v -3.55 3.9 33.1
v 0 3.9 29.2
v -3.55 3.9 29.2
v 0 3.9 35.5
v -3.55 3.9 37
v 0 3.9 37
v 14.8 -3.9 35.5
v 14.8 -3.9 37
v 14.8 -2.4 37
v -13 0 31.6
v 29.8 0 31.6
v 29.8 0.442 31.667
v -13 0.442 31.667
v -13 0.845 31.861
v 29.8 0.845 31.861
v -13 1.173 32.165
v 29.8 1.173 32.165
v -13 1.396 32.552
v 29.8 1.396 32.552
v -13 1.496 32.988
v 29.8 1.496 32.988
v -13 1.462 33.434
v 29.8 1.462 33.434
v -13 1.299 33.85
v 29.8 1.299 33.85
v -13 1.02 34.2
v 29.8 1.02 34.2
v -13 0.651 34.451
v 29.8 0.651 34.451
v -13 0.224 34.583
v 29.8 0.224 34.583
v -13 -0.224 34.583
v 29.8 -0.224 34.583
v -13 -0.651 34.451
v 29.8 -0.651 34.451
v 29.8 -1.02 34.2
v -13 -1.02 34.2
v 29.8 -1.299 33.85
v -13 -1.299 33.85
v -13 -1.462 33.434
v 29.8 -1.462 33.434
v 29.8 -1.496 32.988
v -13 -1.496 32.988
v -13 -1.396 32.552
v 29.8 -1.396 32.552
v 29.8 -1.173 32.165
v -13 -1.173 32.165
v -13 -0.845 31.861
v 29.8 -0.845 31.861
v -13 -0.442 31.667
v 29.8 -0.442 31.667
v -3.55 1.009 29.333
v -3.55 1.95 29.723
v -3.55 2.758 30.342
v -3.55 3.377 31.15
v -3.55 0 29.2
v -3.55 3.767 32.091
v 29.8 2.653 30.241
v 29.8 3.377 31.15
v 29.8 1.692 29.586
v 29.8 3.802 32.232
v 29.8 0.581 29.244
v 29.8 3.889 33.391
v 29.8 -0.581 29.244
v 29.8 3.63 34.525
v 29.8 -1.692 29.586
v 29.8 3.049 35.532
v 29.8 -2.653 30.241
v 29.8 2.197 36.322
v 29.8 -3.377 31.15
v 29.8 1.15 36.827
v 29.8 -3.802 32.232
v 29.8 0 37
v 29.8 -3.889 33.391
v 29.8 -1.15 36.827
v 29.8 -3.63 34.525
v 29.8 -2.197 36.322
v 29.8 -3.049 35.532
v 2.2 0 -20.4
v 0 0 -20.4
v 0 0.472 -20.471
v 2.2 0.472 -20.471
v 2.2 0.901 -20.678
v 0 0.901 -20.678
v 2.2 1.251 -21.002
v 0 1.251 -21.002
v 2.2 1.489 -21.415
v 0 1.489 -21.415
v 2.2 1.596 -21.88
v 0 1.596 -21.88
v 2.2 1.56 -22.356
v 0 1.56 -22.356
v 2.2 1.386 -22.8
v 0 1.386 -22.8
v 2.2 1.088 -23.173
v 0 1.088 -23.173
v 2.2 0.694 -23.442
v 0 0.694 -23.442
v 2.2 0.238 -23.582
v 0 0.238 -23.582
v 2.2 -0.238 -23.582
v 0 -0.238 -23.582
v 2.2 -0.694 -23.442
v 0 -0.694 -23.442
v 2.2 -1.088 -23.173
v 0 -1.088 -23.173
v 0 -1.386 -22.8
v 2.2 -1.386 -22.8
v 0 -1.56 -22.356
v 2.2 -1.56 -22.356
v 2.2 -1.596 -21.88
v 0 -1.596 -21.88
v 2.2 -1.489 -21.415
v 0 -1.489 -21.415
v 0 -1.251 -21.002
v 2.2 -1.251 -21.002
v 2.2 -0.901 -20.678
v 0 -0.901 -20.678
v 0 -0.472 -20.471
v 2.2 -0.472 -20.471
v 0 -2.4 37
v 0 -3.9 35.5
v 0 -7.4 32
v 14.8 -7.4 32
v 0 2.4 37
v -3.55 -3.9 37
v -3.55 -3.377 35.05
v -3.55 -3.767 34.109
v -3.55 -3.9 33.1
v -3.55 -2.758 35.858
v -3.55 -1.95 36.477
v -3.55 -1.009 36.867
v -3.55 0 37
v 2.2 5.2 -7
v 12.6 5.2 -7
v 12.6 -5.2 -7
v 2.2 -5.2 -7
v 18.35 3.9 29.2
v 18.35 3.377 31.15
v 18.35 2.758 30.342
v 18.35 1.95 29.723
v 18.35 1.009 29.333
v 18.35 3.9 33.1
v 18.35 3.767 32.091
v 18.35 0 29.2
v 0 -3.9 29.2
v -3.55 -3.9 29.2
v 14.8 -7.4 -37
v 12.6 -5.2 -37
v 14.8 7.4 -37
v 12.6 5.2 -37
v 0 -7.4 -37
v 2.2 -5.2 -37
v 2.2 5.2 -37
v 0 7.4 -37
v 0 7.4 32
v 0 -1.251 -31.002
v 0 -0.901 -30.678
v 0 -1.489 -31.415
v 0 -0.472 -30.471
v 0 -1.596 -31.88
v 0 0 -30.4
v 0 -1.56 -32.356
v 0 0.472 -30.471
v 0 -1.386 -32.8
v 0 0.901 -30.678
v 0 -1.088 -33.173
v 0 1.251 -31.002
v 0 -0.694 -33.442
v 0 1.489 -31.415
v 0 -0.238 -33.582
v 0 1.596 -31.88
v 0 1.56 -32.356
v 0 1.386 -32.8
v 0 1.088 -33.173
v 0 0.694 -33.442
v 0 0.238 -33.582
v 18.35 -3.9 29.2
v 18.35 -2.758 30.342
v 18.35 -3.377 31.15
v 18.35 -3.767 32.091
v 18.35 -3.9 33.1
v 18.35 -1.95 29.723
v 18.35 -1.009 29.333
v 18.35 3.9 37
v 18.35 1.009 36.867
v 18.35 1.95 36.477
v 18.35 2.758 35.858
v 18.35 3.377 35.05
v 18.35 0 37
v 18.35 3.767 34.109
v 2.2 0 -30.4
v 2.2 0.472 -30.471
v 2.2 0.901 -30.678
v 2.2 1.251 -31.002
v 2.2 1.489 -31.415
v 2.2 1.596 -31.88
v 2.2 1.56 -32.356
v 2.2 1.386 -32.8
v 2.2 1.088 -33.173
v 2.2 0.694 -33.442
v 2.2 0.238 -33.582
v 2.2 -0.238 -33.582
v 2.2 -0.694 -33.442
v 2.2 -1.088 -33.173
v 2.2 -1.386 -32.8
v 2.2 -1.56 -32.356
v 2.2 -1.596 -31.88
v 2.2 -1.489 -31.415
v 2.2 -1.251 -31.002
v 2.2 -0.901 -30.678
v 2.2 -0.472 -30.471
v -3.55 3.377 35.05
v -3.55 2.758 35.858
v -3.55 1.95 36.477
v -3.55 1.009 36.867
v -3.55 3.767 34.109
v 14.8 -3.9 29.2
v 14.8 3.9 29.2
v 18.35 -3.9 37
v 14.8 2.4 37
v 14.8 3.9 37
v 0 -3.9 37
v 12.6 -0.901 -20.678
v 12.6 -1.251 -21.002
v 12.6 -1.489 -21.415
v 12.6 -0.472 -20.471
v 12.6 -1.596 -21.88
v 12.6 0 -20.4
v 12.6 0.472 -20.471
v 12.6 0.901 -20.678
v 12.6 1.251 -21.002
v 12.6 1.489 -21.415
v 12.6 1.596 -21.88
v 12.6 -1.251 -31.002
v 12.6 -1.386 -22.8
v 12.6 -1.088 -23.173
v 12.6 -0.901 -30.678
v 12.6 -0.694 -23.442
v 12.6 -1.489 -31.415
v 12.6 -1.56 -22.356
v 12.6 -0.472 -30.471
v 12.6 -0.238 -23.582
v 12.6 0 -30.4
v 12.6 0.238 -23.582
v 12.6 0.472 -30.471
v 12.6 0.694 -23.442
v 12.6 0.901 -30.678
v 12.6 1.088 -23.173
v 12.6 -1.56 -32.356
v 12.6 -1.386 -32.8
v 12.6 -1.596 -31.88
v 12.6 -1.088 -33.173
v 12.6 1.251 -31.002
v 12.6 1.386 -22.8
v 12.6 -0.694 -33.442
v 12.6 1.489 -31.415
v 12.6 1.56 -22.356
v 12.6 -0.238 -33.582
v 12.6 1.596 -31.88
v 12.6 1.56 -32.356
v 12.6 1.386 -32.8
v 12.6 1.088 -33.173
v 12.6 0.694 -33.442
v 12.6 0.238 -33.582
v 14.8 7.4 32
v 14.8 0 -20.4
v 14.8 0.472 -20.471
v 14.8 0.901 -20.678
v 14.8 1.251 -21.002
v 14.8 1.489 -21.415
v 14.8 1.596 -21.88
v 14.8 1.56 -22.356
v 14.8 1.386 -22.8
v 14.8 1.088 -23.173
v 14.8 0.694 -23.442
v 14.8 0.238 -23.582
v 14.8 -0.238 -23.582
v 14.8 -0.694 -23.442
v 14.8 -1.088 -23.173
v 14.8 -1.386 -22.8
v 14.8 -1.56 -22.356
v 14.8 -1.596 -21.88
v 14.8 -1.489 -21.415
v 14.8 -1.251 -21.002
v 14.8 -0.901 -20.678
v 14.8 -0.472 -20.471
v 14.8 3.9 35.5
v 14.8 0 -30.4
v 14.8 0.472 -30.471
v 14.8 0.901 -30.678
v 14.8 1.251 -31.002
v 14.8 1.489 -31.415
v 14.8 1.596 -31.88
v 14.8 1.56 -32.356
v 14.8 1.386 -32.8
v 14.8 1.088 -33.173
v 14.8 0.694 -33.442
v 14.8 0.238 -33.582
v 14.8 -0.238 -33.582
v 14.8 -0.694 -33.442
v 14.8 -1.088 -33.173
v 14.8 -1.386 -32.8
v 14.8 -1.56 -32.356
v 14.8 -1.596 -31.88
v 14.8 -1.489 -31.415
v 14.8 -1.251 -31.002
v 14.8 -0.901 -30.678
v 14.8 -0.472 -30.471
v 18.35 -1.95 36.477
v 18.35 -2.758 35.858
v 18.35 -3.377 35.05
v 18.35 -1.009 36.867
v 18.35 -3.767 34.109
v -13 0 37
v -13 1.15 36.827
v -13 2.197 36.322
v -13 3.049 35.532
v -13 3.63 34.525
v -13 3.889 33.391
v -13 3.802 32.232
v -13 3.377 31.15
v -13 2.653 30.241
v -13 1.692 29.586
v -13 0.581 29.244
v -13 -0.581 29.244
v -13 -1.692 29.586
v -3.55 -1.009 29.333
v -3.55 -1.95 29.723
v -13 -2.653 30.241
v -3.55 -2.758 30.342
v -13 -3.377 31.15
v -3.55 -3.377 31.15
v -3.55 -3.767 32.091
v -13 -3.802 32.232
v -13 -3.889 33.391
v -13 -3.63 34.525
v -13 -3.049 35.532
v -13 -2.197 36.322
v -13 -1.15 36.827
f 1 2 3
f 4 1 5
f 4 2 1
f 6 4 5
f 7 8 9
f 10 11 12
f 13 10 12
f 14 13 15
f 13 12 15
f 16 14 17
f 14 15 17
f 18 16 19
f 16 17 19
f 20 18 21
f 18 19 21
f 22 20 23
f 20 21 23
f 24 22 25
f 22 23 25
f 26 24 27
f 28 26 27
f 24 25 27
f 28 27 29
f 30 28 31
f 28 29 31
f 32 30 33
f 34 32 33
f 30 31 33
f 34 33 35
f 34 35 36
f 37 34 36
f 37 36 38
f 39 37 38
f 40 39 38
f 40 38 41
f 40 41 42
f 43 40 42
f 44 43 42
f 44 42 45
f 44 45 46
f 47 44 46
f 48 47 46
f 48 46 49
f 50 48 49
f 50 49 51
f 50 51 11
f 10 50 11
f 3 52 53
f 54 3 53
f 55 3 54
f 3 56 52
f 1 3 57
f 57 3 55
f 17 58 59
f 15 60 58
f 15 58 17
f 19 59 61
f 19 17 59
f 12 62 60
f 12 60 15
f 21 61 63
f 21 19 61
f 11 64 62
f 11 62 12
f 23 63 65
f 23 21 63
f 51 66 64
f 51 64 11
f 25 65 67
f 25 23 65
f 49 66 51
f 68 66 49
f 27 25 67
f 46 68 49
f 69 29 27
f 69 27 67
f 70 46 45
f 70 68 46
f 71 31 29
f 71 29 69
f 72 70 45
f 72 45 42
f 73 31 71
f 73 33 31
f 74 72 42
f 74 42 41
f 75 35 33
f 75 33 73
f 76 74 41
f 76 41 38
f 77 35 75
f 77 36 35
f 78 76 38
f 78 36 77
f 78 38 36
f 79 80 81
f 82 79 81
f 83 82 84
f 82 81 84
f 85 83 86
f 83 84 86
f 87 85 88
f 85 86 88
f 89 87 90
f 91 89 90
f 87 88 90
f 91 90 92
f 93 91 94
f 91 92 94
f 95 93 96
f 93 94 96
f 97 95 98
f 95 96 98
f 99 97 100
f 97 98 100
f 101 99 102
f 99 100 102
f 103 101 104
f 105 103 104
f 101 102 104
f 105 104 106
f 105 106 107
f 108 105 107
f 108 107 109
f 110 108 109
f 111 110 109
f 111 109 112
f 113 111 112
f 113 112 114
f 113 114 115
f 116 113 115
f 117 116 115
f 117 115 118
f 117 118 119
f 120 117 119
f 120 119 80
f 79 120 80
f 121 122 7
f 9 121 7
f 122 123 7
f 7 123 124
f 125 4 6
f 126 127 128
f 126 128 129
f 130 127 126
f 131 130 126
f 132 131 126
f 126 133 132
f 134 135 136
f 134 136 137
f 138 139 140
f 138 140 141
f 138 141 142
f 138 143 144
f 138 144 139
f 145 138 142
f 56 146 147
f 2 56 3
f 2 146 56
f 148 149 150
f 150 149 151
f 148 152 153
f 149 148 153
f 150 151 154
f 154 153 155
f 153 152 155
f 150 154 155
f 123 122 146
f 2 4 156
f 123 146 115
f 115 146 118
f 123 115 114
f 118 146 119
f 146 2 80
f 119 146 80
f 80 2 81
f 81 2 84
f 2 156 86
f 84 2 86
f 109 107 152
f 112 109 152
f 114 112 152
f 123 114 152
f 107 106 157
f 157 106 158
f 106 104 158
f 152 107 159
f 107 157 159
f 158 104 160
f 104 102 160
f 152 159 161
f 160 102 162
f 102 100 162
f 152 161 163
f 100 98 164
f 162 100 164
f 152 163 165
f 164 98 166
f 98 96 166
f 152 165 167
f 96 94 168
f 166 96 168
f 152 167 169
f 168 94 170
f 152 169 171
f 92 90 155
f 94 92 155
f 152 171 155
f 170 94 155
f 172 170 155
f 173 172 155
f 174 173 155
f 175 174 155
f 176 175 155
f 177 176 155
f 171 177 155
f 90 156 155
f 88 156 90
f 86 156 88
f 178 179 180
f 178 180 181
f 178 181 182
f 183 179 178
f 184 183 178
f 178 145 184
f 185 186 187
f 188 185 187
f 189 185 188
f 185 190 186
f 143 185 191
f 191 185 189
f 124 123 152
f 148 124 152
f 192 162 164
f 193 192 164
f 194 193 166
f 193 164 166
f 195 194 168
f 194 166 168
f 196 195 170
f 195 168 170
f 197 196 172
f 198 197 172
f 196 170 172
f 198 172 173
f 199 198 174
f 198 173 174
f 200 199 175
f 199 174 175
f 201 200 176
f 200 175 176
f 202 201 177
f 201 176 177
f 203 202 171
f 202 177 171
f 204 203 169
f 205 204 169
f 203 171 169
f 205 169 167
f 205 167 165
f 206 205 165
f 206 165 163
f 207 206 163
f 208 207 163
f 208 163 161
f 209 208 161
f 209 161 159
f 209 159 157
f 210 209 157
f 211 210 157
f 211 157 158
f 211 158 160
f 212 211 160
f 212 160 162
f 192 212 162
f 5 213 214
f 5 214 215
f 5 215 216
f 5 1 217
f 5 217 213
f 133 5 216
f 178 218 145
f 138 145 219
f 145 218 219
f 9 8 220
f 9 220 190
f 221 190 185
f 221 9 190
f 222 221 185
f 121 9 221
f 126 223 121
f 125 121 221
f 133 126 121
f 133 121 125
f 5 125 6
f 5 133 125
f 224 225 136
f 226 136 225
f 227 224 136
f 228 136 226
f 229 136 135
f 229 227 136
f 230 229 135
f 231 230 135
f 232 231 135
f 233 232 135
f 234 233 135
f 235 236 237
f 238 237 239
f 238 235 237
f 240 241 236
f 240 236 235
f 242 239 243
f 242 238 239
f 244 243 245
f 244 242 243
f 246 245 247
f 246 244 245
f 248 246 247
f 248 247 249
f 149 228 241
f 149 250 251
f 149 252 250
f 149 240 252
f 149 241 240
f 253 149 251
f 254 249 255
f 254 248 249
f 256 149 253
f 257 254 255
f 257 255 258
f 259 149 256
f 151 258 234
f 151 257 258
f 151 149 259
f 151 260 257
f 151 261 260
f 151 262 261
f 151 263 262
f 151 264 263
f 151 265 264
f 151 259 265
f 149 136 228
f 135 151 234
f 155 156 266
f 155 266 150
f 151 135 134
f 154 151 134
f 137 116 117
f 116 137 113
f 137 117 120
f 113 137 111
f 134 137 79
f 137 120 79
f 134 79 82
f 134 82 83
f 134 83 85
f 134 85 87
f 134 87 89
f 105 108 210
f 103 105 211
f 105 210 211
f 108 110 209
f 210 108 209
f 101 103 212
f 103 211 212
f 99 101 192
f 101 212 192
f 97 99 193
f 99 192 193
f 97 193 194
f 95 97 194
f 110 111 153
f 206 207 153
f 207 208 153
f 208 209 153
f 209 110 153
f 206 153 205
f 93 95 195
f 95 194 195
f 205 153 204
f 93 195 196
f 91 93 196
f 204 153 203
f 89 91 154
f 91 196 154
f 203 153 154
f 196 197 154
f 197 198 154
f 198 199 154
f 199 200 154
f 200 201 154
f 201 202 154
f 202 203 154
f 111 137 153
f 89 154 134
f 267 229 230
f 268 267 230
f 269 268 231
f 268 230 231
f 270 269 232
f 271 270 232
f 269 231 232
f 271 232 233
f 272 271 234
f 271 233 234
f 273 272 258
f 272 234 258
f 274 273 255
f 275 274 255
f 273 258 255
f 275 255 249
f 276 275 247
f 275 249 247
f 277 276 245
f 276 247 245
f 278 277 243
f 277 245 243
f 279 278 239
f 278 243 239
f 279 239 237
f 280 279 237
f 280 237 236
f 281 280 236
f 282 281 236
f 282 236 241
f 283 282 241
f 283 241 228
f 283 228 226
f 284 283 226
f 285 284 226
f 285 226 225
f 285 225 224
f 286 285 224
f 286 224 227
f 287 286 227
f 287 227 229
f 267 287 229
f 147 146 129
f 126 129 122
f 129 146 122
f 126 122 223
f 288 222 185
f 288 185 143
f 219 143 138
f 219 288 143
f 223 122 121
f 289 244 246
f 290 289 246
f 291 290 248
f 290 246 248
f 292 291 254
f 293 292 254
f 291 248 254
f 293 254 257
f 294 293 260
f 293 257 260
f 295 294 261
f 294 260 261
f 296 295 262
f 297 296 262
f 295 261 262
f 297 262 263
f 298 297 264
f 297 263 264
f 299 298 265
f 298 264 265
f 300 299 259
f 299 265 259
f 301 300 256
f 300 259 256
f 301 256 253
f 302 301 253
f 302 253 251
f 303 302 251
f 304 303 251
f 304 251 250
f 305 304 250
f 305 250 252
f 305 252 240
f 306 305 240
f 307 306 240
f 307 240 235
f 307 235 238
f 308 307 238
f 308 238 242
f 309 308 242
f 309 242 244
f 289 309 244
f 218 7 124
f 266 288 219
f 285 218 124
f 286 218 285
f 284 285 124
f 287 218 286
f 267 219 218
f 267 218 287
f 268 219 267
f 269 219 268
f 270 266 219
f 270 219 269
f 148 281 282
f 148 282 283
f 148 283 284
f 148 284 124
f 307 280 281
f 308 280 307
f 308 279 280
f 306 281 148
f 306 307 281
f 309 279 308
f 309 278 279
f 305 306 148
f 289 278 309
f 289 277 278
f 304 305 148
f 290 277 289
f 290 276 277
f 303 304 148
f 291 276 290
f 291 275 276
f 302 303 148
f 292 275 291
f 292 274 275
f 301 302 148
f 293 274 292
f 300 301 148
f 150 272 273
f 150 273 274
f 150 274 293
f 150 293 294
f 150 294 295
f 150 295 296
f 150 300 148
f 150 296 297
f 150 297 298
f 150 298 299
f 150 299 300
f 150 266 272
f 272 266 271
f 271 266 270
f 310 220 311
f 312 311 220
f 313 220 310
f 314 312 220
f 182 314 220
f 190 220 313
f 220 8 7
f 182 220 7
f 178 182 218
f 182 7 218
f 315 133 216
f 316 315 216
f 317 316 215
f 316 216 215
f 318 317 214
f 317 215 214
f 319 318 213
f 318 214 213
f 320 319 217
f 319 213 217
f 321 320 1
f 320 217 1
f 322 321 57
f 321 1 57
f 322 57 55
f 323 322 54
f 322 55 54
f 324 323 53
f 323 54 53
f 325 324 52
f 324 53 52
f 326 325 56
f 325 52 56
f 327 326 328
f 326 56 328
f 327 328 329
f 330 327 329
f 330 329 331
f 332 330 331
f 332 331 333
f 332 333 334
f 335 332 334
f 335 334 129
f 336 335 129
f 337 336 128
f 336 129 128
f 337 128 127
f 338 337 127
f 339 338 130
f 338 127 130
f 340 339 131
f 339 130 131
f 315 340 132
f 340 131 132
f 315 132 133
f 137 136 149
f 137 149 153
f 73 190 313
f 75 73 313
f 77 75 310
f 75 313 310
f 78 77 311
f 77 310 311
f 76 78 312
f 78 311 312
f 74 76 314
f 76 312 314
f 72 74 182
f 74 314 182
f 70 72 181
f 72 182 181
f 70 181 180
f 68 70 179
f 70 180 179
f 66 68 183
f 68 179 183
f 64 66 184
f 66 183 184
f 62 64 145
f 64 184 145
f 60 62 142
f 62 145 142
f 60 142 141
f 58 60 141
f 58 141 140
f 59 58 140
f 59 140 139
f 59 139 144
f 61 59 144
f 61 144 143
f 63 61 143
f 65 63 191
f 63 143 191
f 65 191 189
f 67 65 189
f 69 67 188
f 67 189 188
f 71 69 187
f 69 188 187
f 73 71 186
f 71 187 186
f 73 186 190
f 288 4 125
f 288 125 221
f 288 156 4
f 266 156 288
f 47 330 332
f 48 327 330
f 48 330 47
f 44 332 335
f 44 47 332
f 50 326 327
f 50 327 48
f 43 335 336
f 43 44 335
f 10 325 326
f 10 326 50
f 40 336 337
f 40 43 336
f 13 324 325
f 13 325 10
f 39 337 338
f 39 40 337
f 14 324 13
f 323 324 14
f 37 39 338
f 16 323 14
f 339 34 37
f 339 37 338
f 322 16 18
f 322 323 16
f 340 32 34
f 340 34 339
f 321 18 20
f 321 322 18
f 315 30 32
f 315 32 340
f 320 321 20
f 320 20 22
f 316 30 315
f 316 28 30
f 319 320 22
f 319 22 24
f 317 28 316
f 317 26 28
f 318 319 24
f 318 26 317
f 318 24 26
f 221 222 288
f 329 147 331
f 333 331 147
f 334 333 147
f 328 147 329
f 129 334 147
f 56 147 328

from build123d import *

# Parameters (mm, degrees)
SKETCH_1_W          = 74
SKETCH_1_H          = 14.8
EXTRUDE_1_DEPTH     = 14.8
SKETCH_2_W          = 10.4
SKETCH_2_H          = 10.4
CUT_EXTRUDE_1_DEPTH = 30
SKETCH_3_R          = 3.9
EXTRUDE_2_DEPTH     = 15
SKETCH_4_R          = 3.9
EXTRUDE_3_DEPTH     = 13
CHAMFER_1_SIZE      = 5
SKETCH_8_R          = 1.45
CUT_EXTRUDE_4_DEPTH = 43.8
SKETCH_9_W          = 7.8
SKETCH_9_H          = 7.8
SKETCH_9_R          = 1.5
EXTRUDE_4_DEPTH     = 3.55
SKETCH_10_W         = 7.8
SKETCH_10_H         = 7.8
EXTRUDE_5_DEPTH     = 3.55
SKETCH1_R           = 1.6
CUT_EXTRUDE1_DEPTH  = 30.8
SKETCH2_R           = 1.5
CUT_EXTRUDE2_DEPTH  = 43.8


with BuildPart() as part:
    # Эскиз1 → Бобышка-Вытянуть1 (new body)
    with BuildSketch(Plane(origin=(0, 0, 0), x_dir=(0, 0, -1), z_dir=(1, 0, 0))):
        Rectangle(SKETCH_1_W, SKETCH_1_H)
    extrude(amount=EXTRUDE_1_DEPTH)

    # Эскиз2 → Вырез-Вытянуть1 (cut)
    with BuildSketch(Plane(origin=(0, 0, -37), x_dir=(-1, 0, 0), z_dir=(0, 0, -1))):
        with Locations((-7.4, 0)):
            Rectangle(SKETCH_2_W, SKETCH_2_H)
    extrude(amount=-CUT_EXTRUDE_1_DEPTH, mode=Mode.SUBTRACT)

    # Эскиз3 → Бобышка-Вытянуть2 (add)
    with BuildSketch(Plane(origin=(14.8, 0, 0), x_dir=(0, 0, -1), z_dir=(1, 0, 0))):
        with Locations(Location((-33.1, 0, 0), (0, 0, 180))):  # turned: the seam where the file's is
            Circle(SKETCH_3_R)
    extrude(amount=EXTRUDE_2_DEPTH)

    # Эскиз4 → Бобышка-Вытянуть3 (add)
    with BuildSketch(Plane.ZY):
        with Locations((33.1, 0)):
            Circle(SKETCH_4_R)
    extrude(amount=EXTRUDE_3_DEPTH)

    # Фаска1
    chamfer_1_edges = [part.edges().sort_by_distance(p)[0] for p in [
        (7.4, 7.4, 37),
        (7.4, -7.4, 37),
    ]]
    chamfer(chamfer_1_edges, length=CHAMFER_1_SIZE)

    # Эскиз8 → Вырез-Вытянуть4 (cut, through all)
    with BuildSketch(Plane(origin=(29.8, 0, 0), x_dir=(0, 0, -1), z_dir=(1, 0, 0))):
        with Locations((-33.1, 0)):
            Circle(SKETCH_8_R)
    extrude(amount=-CUT_EXTRUDE_4_DEPTH, mode=Mode.SUBTRACT)

    # Эскиз9 → Бобышка-Вытянуть4 (add)
    with BuildSketch(Plane.ZY):
        with Locations((33.1, 0)):
            Rectangle(SKETCH_9_W, SKETCH_9_H)
        with Locations((33.1, 0)):
            Circle(SKETCH_9_R, mode=Mode.SUBTRACT)
    extrude(amount=EXTRUDE_4_DEPTH)

    # Эскиз10 → Бобышка-Вытянуть5 (add)
    with BuildSketch(Plane(origin=(14.8, 0, 0), x_dir=(0, 0, -1), z_dir=(1, 0, 0))):
        with Locations((-33.1, 0)):
            Rectangle(SKETCH_10_W, SKETCH_10_H)
    extrude(amount=EXTRUDE_5_DEPTH)

    # Sketch1 → Cut-Extrude1 (cut, through all)
    with BuildSketch(Plane.ZY):
        with Locations((-32, 0)):
            Circle(SKETCH1_R)
        with Locations((-22, 0)):
            Circle(SKETCH1_R)
    extrude(amount=-CUT_EXTRUDE1_DEPTH, mode=Mode.SUBTRACT)

    # Sketch2 → Cut-Extrude2 (cut, through all)
    with BuildSketch(Plane(origin=(29.8, 0, 0), x_dir=(0, 0, -1), z_dir=(1, 0, 0))):
        with Locations((-33.1, 0)):
            Circle(SKETCH2_R)
    extrude(amount=-CUT_EXTRUDE2_DEPTH, mode=Mode.SUBTRACT)


solid = part.part
